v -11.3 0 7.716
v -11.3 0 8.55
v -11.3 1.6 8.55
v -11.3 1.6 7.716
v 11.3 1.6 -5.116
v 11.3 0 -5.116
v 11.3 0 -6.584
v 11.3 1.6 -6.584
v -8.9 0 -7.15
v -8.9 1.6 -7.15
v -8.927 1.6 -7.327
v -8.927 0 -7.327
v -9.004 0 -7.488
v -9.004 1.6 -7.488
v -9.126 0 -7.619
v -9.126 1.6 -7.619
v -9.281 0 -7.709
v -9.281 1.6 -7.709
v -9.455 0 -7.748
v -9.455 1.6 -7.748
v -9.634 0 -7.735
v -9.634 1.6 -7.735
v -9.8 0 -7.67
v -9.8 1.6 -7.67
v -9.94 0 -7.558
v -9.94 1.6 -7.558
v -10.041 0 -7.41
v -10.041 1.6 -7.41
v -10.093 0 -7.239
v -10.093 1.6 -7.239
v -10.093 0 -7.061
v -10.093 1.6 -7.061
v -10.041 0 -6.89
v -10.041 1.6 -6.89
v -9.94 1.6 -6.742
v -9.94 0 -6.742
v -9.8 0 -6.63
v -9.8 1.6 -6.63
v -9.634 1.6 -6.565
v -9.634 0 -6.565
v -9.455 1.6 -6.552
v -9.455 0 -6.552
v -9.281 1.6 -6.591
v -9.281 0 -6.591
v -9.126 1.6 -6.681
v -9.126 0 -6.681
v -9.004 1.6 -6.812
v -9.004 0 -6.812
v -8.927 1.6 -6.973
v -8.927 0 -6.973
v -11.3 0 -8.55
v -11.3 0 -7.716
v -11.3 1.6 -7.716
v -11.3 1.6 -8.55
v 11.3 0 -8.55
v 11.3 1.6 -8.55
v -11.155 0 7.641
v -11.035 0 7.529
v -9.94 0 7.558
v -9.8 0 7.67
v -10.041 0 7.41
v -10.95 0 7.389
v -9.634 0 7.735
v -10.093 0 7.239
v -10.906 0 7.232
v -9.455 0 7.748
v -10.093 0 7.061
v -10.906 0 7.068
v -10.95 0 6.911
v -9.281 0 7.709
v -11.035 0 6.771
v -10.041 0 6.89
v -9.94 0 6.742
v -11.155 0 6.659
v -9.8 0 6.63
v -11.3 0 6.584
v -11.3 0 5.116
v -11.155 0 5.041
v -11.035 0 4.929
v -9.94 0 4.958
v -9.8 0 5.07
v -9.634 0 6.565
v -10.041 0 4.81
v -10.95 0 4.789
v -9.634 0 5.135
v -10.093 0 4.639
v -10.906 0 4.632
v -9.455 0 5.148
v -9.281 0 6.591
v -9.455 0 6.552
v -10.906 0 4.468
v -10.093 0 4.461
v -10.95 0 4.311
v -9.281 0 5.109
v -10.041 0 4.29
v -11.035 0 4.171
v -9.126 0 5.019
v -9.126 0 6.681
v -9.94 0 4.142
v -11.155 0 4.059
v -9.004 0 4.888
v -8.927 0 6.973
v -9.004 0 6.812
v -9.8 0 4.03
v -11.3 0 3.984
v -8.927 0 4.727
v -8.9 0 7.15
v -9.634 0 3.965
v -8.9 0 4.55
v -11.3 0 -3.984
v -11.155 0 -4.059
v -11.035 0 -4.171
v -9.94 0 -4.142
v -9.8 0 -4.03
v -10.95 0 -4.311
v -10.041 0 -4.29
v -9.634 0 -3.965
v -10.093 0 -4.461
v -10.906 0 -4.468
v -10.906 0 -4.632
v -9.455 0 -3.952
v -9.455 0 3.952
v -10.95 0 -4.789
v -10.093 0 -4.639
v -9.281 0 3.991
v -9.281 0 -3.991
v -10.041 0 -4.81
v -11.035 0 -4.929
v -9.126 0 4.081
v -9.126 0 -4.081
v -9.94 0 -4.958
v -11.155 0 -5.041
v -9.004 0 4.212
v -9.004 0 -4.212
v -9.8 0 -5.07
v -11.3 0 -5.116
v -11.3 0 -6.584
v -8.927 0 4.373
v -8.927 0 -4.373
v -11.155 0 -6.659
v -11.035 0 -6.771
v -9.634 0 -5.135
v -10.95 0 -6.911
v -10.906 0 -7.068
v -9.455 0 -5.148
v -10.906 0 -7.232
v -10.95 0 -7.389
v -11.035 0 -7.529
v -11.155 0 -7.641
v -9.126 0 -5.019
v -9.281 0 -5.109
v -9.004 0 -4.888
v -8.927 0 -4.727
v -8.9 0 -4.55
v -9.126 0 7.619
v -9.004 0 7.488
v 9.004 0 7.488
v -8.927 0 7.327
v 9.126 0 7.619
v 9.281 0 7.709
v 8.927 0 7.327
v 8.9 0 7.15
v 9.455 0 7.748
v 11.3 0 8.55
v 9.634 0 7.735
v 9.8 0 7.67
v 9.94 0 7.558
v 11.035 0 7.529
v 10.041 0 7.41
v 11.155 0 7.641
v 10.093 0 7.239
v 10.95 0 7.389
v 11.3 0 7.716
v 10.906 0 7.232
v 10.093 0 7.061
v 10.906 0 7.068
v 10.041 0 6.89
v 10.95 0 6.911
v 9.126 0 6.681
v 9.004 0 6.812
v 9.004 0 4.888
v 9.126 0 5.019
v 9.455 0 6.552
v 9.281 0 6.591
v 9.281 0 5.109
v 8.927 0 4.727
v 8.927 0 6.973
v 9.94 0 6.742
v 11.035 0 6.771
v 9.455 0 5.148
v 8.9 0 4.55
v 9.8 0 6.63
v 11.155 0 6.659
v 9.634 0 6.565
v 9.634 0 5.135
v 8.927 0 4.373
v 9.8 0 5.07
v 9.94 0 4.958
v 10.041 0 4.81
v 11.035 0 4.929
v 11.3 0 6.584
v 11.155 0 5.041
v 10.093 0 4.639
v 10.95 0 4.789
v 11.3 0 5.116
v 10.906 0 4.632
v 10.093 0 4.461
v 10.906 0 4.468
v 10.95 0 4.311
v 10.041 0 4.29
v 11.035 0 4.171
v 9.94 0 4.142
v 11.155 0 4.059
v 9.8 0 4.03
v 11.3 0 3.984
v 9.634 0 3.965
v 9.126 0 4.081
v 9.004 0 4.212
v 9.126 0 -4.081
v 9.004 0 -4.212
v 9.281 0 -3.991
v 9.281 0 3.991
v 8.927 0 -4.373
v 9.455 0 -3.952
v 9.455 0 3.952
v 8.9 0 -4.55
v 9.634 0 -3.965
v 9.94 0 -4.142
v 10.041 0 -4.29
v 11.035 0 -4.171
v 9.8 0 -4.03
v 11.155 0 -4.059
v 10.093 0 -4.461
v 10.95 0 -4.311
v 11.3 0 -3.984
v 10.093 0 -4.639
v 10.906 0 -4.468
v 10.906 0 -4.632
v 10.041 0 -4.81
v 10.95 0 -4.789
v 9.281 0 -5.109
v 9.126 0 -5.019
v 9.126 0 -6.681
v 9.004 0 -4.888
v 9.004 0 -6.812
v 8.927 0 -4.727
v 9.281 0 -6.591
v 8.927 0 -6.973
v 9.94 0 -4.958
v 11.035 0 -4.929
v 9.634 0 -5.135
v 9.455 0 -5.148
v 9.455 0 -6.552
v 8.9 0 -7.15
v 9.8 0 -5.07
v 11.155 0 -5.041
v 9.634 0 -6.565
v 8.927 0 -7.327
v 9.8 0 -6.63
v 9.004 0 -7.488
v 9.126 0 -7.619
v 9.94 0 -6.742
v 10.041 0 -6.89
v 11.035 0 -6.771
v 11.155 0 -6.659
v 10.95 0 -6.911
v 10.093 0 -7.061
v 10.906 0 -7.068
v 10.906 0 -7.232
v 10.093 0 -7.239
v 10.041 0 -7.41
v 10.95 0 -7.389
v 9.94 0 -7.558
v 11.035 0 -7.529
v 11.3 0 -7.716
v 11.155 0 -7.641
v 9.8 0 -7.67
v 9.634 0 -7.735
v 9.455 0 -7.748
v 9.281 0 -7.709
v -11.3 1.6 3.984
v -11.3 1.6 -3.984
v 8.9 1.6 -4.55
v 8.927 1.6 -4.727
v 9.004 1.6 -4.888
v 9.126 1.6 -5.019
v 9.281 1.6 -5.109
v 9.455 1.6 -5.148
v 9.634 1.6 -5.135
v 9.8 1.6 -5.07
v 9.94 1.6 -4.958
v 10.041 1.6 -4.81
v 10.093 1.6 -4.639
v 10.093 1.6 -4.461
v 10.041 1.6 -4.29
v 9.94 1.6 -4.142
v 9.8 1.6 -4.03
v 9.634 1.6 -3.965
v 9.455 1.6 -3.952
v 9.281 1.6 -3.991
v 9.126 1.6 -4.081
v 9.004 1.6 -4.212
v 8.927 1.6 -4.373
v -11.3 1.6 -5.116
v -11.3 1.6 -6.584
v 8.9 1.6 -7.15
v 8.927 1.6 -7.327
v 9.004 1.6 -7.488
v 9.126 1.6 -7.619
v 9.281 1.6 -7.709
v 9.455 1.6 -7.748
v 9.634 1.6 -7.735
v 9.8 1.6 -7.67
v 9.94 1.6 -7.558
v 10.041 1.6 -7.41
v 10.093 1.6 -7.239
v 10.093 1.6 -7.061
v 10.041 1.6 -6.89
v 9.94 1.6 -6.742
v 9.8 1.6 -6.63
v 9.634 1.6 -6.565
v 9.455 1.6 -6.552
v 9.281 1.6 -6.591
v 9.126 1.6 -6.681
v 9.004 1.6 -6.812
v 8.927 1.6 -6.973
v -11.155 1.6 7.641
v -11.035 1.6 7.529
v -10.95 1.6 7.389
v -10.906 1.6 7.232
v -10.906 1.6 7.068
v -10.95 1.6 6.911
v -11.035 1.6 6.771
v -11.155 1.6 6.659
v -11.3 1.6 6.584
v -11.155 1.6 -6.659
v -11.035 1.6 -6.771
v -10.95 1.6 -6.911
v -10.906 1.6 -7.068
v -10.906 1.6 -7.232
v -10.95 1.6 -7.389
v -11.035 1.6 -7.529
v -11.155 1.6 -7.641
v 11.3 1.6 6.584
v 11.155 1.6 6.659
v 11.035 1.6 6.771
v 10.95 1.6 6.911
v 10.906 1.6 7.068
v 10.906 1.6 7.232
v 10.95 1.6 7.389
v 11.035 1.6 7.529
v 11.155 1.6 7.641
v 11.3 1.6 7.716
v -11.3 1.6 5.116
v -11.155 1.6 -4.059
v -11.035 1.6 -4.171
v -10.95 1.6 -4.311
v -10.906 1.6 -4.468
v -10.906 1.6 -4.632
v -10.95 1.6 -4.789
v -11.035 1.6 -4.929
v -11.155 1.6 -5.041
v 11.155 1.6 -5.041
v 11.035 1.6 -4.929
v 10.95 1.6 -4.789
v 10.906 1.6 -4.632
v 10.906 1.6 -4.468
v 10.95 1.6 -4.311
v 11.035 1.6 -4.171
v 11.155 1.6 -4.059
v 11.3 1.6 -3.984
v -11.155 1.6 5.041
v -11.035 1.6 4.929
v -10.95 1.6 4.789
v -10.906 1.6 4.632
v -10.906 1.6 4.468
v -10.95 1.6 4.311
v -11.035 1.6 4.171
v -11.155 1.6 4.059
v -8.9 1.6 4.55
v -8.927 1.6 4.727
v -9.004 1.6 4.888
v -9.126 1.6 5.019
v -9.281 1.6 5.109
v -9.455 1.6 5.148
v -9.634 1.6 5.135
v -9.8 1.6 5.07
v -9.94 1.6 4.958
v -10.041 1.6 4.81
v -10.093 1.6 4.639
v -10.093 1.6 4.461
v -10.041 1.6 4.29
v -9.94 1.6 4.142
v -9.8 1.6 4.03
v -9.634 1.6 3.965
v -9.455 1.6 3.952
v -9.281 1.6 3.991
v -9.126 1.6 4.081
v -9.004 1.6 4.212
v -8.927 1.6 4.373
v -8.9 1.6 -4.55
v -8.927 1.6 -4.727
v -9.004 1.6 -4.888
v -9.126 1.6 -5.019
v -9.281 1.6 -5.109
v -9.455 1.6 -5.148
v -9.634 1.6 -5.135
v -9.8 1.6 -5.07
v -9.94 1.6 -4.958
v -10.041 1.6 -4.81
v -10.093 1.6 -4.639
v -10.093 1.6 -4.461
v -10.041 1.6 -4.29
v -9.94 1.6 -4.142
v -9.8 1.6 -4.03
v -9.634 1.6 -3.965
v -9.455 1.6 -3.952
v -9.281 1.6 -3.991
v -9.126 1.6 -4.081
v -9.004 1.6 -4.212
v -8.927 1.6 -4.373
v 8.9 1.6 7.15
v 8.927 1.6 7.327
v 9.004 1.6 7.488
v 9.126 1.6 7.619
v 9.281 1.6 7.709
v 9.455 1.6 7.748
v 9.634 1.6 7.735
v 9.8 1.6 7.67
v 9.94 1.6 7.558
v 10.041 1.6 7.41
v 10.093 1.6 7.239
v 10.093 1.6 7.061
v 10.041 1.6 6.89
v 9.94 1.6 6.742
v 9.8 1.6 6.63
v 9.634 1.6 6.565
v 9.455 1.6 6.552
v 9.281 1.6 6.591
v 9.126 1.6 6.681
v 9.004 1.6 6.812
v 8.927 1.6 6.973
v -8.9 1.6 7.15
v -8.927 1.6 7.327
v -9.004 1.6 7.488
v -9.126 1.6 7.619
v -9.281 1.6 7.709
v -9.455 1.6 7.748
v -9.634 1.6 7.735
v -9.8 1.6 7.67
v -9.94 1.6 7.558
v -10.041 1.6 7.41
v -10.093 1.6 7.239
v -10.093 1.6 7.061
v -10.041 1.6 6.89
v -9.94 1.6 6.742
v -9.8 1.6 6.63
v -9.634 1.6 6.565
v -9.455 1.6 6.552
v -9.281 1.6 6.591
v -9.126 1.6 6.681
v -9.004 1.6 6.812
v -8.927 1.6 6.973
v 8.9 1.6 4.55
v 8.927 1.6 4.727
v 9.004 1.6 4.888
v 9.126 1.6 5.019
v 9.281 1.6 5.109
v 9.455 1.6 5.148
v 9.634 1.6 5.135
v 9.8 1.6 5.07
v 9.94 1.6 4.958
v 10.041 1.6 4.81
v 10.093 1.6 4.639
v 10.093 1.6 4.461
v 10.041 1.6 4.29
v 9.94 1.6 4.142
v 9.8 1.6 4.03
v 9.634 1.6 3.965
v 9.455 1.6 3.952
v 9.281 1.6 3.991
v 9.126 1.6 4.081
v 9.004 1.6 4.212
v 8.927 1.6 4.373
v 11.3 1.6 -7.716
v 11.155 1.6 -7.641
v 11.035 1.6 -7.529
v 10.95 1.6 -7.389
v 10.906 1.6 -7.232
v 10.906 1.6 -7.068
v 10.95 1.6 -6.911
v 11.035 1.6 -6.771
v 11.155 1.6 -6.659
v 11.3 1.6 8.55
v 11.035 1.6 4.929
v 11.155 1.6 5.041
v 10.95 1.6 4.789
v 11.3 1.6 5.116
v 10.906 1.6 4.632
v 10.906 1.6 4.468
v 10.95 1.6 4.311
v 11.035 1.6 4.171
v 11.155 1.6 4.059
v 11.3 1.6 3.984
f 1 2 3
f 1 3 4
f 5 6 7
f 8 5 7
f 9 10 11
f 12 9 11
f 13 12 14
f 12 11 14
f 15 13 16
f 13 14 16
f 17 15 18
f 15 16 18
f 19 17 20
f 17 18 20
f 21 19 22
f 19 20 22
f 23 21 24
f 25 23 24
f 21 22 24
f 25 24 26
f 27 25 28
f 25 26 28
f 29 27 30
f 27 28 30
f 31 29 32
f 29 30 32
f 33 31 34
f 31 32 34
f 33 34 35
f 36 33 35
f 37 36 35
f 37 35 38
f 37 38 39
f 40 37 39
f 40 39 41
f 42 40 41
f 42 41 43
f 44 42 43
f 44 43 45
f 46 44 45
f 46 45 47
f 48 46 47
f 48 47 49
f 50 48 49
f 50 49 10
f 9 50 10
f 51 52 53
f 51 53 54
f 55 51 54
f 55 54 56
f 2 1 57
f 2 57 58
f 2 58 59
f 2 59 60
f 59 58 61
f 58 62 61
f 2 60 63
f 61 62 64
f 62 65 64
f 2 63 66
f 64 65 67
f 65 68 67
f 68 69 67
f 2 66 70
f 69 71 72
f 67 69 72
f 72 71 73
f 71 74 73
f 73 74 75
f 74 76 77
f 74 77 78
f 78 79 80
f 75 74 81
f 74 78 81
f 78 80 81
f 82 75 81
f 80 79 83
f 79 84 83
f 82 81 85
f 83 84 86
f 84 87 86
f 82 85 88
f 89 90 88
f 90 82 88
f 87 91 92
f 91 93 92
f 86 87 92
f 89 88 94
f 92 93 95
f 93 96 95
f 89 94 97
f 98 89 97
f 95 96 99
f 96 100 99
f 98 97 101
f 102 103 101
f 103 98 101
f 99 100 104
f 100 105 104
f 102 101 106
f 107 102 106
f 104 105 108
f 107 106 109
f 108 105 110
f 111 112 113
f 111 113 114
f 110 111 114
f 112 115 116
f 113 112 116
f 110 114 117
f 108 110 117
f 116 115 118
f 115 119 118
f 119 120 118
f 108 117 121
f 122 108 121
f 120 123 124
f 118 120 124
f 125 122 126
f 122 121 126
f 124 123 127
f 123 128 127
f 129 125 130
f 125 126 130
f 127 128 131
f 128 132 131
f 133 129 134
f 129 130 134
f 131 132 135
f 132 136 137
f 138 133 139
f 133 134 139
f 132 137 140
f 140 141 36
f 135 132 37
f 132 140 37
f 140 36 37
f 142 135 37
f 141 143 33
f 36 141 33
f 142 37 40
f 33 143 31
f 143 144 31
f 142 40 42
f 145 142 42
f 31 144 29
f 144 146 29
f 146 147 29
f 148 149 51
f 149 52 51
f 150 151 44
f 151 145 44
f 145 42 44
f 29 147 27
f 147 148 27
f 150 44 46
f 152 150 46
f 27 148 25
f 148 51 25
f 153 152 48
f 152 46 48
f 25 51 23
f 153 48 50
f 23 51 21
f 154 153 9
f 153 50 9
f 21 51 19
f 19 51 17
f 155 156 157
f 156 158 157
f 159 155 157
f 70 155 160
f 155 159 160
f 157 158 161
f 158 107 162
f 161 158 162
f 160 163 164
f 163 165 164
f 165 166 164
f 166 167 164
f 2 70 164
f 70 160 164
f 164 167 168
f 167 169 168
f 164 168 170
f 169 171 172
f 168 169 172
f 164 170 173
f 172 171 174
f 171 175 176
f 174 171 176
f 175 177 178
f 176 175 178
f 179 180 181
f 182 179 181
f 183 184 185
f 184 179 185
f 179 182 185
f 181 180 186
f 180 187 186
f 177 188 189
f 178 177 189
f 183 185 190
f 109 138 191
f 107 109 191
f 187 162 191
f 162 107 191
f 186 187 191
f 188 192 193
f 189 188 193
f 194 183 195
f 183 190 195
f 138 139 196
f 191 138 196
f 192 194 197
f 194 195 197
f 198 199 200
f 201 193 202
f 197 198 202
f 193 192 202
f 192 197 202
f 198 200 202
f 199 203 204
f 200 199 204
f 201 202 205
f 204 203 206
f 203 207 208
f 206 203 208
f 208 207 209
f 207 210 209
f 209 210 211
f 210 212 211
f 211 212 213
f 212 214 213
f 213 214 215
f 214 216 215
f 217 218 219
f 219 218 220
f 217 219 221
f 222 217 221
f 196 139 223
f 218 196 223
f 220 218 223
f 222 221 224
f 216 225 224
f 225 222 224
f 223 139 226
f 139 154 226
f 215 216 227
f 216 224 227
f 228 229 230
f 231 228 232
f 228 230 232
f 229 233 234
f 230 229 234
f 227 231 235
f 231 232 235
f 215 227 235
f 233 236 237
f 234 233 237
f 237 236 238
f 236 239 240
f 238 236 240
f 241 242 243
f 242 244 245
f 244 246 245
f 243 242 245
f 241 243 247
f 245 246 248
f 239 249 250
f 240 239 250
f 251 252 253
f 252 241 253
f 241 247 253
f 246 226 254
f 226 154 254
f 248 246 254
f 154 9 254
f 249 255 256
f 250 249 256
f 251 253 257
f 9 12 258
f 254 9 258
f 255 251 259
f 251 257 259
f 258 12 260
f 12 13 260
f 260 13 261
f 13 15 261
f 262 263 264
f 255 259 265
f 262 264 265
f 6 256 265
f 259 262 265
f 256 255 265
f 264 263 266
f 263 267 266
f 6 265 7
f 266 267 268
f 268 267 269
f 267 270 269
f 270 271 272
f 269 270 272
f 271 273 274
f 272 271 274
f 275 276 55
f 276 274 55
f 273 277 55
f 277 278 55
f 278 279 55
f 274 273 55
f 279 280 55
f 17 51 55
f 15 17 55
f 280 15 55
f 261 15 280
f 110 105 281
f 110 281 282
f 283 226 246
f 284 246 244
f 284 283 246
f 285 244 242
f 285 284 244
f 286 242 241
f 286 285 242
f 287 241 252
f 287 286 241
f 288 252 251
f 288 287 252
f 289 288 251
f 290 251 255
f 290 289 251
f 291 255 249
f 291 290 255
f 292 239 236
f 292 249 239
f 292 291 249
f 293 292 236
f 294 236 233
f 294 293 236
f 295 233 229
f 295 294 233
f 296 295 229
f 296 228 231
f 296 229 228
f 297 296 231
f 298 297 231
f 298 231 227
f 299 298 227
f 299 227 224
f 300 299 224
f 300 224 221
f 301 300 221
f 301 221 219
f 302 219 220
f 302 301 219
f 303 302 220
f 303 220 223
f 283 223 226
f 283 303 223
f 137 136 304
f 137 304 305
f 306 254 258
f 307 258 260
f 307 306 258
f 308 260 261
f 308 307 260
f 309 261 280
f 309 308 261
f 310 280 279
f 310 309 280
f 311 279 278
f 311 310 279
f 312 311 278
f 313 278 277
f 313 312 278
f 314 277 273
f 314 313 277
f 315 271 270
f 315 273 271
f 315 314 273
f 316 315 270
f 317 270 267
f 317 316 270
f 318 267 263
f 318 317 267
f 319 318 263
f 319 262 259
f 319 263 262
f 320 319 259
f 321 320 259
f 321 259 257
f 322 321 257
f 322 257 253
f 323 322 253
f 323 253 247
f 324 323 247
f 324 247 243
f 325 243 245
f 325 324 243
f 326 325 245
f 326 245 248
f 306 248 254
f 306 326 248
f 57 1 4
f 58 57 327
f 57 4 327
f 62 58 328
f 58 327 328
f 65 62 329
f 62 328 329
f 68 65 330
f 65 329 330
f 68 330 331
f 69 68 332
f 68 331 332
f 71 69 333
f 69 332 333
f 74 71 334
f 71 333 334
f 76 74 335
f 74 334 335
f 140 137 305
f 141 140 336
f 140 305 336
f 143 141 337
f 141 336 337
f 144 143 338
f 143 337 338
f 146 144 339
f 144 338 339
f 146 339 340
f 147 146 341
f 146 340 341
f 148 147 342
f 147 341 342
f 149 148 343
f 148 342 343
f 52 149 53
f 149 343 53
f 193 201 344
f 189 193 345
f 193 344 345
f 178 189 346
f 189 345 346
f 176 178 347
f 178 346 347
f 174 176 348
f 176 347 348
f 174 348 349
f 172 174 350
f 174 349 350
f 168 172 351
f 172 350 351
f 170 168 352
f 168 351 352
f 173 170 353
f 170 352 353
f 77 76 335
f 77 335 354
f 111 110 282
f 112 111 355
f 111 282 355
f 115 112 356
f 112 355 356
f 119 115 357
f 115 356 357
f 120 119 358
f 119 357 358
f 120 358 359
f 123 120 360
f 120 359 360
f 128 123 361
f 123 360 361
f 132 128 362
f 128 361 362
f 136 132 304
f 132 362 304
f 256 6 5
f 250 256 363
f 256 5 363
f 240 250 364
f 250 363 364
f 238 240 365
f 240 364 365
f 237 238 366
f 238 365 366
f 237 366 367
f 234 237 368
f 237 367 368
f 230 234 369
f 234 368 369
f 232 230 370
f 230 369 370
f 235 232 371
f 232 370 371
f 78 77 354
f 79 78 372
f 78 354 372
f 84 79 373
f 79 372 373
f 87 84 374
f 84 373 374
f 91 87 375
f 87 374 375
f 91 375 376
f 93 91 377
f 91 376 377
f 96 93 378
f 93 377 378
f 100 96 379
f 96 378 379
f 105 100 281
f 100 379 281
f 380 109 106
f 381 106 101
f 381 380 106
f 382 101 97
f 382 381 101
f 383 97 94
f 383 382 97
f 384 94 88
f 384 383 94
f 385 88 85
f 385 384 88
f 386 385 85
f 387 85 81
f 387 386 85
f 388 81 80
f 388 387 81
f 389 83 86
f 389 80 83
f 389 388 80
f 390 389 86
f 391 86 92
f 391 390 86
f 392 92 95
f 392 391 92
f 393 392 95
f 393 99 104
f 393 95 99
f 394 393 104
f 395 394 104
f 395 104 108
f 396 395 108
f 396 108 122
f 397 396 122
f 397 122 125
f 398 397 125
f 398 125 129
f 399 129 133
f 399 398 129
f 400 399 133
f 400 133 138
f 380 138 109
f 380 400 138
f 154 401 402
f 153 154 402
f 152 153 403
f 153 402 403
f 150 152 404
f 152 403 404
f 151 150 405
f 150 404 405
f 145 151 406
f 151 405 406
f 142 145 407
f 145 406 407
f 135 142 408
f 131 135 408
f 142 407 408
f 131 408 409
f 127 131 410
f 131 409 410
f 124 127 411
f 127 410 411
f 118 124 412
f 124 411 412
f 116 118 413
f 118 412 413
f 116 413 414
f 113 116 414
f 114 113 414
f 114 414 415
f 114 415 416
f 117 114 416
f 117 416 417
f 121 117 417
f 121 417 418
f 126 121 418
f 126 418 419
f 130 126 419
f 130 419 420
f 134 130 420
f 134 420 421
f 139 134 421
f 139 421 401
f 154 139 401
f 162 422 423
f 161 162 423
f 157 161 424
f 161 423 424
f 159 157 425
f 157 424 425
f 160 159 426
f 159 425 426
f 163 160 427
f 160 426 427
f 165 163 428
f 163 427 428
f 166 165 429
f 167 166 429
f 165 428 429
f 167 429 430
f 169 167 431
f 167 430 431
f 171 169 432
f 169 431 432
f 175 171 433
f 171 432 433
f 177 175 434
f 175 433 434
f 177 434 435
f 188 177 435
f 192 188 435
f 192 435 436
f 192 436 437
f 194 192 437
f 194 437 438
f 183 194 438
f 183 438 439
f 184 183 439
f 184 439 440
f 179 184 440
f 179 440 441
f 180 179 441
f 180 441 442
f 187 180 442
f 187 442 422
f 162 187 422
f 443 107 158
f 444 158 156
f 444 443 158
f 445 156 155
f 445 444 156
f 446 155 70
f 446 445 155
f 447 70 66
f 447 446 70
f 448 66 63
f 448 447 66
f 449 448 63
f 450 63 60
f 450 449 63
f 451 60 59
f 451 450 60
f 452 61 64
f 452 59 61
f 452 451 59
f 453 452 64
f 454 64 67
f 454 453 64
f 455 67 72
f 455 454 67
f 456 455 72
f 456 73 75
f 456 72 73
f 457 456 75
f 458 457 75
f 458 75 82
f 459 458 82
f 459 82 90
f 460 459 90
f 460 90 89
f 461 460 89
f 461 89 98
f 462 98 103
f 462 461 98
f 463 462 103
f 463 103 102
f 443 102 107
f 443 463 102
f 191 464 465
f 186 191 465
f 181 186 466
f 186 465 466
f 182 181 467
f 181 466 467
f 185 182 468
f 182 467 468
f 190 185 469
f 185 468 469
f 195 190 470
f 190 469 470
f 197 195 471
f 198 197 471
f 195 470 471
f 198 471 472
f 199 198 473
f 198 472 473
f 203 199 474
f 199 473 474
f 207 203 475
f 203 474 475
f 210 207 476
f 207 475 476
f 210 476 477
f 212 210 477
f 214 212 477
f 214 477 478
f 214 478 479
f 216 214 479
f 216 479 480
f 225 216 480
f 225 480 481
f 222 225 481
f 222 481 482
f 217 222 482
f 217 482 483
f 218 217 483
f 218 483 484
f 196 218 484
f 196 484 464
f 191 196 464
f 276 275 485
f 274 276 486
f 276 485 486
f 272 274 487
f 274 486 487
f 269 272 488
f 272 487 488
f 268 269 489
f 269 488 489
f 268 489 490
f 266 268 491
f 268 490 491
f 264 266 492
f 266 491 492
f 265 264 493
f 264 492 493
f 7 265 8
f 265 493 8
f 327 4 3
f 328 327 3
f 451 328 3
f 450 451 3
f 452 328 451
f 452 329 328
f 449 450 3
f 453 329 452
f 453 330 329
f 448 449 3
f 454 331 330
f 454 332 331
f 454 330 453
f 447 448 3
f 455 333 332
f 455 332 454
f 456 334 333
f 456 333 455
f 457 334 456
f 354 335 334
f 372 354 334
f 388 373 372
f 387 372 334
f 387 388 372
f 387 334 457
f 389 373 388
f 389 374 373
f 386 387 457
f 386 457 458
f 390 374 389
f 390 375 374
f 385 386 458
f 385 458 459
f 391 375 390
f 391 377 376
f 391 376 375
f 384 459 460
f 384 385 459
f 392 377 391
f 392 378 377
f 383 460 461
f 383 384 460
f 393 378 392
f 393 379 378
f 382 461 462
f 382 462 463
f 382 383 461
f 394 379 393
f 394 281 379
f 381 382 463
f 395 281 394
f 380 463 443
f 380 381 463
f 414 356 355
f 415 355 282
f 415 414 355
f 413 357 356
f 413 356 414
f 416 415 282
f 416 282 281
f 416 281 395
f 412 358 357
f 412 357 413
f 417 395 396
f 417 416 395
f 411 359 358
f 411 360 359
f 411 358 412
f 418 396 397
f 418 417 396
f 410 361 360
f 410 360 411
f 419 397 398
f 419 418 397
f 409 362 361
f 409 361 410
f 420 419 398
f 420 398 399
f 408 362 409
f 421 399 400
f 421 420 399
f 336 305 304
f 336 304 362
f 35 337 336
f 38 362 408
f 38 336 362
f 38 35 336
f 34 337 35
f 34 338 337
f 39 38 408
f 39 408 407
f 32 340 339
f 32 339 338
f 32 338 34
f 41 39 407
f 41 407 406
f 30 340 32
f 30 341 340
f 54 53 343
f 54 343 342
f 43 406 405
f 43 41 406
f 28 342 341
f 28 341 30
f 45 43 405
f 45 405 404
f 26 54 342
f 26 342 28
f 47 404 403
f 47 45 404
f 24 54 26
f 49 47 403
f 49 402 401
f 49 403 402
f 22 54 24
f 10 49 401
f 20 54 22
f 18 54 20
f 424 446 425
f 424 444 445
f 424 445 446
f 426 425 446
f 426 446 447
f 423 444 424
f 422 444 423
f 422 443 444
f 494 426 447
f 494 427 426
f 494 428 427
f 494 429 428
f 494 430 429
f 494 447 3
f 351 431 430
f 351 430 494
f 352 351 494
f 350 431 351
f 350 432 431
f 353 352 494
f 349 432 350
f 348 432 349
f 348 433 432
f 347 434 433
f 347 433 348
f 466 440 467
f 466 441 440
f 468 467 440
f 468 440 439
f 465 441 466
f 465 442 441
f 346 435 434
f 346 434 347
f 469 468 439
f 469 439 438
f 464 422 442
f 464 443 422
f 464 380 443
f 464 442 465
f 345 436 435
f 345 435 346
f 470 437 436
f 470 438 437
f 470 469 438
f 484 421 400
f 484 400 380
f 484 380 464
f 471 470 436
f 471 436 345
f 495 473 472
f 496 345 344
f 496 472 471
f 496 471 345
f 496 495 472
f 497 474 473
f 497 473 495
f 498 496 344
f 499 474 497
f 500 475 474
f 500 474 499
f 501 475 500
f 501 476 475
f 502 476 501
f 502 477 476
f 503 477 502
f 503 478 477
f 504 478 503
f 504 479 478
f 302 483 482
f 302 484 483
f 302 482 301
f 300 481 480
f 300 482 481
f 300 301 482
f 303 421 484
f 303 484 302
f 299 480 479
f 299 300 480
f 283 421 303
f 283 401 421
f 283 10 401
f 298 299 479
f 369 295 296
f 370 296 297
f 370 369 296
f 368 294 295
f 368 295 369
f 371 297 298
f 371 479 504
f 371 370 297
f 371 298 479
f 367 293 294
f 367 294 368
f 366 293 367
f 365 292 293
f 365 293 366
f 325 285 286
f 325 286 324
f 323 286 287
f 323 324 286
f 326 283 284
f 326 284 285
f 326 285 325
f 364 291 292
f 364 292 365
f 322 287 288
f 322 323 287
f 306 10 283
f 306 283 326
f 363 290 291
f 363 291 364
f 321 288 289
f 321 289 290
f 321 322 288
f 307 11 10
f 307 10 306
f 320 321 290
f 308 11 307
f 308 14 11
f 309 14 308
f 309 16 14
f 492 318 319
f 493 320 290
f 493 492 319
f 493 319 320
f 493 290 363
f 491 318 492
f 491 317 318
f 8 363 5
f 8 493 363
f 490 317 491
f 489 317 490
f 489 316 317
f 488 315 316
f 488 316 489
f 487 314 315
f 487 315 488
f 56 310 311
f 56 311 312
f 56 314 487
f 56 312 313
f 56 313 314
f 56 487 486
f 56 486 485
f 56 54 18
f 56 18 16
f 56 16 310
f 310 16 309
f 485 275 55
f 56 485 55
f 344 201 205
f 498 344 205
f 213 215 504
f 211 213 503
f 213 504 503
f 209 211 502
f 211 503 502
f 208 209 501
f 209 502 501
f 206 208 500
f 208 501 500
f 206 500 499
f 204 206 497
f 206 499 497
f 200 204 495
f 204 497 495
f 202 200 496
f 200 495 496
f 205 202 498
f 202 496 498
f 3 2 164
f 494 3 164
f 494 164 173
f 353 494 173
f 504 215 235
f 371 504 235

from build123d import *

# Parameters (mm, degrees)
SKETCH1_W                       = 22.6
SKETCH1_H                       = 17.1
MAIN_BODY_DEPTH                 = 1.6
SKETCH2_R                       = 0.6
SOLDERED_CONNECTION_HOLES_DEPTH = 2.6
LPATTERN1_COUNT                 = 2
LPATTERN1_PITCH                 = 2
MIRROR1_COPY_1_SKETCH_R         = 0.6
MIRROR1_COPY_1_DEPTH            = 2.6
MIRROR2_COPY_1_SKETCH_R         = 0.6
MIRROR2_COPY_1_DEPTH            = 2.6
MIRROR2_COPY_2_SKETCH_R         = 0.6
MIRROR2_COPY_2_DEPTH            = 2.6
MIRROR2_COPY_3_SKETCH_R         = 0.6
MIRROR2_COPY_3_DEPTH            = 2.6


with BuildPart() as part:
    # Sketch1 → MAIN BODY (new body)
    with BuildSketch(Plane(origin=(0, 0, 0), x_dir=(1, 0, 0), z_dir=(0, 1, 0))):
        Rectangle(SKETCH1_W, SKETCH1_H)
    extrude(amount=MAIN_BODY_DEPTH)

    # Sketch2 → SOLDERED CONNECTION HOLES (cut, through all)
    with BuildSketch(Plane(origin=(0, 1.6, 0), x_dir=(1, 0, 0), z_dir=(0, 1, 0))):
        with Locations((-9.5, 7.15)):
            Circle(SKETCH2_R)
        with Locations((-9.5, 4.55)):
            Circle(SKETCH2_R)
    soldered_connection_holes = extrude(amount=-SOLDERED_CONNECTION_HOLES_DEPTH, mode=Mode.SUBTRACT)

    # LPattern1: SOLDERED CONNECTION HOLES ×2
    with Locations(*[(-i * LPATTERN1_PITCH, 0, 0) for i in range(1, LPATTERN1_COUNT)]):
        add(soldered_connection_holes, mode=Mode.SUBTRACT)

    # Mirror1: SOLDERED CONNECTION HOLES across plane
    add(soldered_connection_holes.mirror(Plane(origin=(0, 0, 0), x_dir=(0, 0, 1), z_dir=(1, 0, 0))), mode=Mode.SUBTRACT)

    # Mirror1 copy 1 sketch → Mirror1 copy 1 (cut, through all)
    with BuildSketch(Plane(origin=(2, 1.6, 0), x_dir=(-1, 0, 0), z_dir=(0, 1, 0))):
        with Locations((-9.5, -7.15)):
            Circle(MIRROR1_COPY_1_SKETCH_R)
        with Locations((-9.5, -4.55)):
            Circle(MIRROR1_COPY_1_SKETCH_R)
    extrude(amount=-MIRROR1_COPY_1_DEPTH, mode=Mode.SUBTRACT)

    # Mirror2: SOLDERED CONNECTION HOLES across plane
    add(soldered_connection_holes.mirror(Plane.XY), mode=Mode.SUBTRACT)

    # Mirror2 copy 1 sketch → Mirror2 copy 1 (cut, through all)
    with BuildSketch(Plane(origin=(-2, 1.6, 0), x_dir=(1, 0, 0), z_dir=(0, 1, 0))):
        with Locations((-9.5, -7.15)):
            Circle(MIRROR2_COPY_1_SKETCH_R)
        with Locations((-9.5, -4.55)):
            Circle(MIRROR2_COPY_1_SKETCH_R)
    extrude(amount=-MIRROR2_COPY_1_DEPTH, mode=Mode.SUBTRACT)

    # Mirror2 copy 2 sketch → Mirror2 copy 2 (cut, through all)
    with BuildSketch(Plane(origin=(0, 1.6, 0), x_dir=(-1, 0, 0), z_dir=(0, 1, 0))):
        with Locations((-9.5, 7.15)):
            Circle(MIRROR2_COPY_2_SKETCH_R)
        with Locations((-9.5, 4.55)):
            Circle(MIRROR2_COPY_2_SKETCH_R)
    extrude(amount=-MIRROR2_COPY_2_DEPTH, mode=Mode.SUBTRACT)

    # Mirror2 copy 3 sketch → Mirror2 copy 3 (cut, through all)
    with BuildSketch(Plane(origin=(2, 1.6, 0), x_dir=(-1, 0, 0), z_dir=(0, 1, 0))):
        with Locations((-9.5, 7.15)):
            Circle(MIRROR2_COPY_3_SKETCH_R)
        with Locations((-9.5, 4.55)):
            Circle(MIRROR2_COPY_3_SKETCH_R)
    extrude(amount=-MIRROR2_COPY_3_DEPTH, mode=Mode.SUBTRACT)


solid = part.part
